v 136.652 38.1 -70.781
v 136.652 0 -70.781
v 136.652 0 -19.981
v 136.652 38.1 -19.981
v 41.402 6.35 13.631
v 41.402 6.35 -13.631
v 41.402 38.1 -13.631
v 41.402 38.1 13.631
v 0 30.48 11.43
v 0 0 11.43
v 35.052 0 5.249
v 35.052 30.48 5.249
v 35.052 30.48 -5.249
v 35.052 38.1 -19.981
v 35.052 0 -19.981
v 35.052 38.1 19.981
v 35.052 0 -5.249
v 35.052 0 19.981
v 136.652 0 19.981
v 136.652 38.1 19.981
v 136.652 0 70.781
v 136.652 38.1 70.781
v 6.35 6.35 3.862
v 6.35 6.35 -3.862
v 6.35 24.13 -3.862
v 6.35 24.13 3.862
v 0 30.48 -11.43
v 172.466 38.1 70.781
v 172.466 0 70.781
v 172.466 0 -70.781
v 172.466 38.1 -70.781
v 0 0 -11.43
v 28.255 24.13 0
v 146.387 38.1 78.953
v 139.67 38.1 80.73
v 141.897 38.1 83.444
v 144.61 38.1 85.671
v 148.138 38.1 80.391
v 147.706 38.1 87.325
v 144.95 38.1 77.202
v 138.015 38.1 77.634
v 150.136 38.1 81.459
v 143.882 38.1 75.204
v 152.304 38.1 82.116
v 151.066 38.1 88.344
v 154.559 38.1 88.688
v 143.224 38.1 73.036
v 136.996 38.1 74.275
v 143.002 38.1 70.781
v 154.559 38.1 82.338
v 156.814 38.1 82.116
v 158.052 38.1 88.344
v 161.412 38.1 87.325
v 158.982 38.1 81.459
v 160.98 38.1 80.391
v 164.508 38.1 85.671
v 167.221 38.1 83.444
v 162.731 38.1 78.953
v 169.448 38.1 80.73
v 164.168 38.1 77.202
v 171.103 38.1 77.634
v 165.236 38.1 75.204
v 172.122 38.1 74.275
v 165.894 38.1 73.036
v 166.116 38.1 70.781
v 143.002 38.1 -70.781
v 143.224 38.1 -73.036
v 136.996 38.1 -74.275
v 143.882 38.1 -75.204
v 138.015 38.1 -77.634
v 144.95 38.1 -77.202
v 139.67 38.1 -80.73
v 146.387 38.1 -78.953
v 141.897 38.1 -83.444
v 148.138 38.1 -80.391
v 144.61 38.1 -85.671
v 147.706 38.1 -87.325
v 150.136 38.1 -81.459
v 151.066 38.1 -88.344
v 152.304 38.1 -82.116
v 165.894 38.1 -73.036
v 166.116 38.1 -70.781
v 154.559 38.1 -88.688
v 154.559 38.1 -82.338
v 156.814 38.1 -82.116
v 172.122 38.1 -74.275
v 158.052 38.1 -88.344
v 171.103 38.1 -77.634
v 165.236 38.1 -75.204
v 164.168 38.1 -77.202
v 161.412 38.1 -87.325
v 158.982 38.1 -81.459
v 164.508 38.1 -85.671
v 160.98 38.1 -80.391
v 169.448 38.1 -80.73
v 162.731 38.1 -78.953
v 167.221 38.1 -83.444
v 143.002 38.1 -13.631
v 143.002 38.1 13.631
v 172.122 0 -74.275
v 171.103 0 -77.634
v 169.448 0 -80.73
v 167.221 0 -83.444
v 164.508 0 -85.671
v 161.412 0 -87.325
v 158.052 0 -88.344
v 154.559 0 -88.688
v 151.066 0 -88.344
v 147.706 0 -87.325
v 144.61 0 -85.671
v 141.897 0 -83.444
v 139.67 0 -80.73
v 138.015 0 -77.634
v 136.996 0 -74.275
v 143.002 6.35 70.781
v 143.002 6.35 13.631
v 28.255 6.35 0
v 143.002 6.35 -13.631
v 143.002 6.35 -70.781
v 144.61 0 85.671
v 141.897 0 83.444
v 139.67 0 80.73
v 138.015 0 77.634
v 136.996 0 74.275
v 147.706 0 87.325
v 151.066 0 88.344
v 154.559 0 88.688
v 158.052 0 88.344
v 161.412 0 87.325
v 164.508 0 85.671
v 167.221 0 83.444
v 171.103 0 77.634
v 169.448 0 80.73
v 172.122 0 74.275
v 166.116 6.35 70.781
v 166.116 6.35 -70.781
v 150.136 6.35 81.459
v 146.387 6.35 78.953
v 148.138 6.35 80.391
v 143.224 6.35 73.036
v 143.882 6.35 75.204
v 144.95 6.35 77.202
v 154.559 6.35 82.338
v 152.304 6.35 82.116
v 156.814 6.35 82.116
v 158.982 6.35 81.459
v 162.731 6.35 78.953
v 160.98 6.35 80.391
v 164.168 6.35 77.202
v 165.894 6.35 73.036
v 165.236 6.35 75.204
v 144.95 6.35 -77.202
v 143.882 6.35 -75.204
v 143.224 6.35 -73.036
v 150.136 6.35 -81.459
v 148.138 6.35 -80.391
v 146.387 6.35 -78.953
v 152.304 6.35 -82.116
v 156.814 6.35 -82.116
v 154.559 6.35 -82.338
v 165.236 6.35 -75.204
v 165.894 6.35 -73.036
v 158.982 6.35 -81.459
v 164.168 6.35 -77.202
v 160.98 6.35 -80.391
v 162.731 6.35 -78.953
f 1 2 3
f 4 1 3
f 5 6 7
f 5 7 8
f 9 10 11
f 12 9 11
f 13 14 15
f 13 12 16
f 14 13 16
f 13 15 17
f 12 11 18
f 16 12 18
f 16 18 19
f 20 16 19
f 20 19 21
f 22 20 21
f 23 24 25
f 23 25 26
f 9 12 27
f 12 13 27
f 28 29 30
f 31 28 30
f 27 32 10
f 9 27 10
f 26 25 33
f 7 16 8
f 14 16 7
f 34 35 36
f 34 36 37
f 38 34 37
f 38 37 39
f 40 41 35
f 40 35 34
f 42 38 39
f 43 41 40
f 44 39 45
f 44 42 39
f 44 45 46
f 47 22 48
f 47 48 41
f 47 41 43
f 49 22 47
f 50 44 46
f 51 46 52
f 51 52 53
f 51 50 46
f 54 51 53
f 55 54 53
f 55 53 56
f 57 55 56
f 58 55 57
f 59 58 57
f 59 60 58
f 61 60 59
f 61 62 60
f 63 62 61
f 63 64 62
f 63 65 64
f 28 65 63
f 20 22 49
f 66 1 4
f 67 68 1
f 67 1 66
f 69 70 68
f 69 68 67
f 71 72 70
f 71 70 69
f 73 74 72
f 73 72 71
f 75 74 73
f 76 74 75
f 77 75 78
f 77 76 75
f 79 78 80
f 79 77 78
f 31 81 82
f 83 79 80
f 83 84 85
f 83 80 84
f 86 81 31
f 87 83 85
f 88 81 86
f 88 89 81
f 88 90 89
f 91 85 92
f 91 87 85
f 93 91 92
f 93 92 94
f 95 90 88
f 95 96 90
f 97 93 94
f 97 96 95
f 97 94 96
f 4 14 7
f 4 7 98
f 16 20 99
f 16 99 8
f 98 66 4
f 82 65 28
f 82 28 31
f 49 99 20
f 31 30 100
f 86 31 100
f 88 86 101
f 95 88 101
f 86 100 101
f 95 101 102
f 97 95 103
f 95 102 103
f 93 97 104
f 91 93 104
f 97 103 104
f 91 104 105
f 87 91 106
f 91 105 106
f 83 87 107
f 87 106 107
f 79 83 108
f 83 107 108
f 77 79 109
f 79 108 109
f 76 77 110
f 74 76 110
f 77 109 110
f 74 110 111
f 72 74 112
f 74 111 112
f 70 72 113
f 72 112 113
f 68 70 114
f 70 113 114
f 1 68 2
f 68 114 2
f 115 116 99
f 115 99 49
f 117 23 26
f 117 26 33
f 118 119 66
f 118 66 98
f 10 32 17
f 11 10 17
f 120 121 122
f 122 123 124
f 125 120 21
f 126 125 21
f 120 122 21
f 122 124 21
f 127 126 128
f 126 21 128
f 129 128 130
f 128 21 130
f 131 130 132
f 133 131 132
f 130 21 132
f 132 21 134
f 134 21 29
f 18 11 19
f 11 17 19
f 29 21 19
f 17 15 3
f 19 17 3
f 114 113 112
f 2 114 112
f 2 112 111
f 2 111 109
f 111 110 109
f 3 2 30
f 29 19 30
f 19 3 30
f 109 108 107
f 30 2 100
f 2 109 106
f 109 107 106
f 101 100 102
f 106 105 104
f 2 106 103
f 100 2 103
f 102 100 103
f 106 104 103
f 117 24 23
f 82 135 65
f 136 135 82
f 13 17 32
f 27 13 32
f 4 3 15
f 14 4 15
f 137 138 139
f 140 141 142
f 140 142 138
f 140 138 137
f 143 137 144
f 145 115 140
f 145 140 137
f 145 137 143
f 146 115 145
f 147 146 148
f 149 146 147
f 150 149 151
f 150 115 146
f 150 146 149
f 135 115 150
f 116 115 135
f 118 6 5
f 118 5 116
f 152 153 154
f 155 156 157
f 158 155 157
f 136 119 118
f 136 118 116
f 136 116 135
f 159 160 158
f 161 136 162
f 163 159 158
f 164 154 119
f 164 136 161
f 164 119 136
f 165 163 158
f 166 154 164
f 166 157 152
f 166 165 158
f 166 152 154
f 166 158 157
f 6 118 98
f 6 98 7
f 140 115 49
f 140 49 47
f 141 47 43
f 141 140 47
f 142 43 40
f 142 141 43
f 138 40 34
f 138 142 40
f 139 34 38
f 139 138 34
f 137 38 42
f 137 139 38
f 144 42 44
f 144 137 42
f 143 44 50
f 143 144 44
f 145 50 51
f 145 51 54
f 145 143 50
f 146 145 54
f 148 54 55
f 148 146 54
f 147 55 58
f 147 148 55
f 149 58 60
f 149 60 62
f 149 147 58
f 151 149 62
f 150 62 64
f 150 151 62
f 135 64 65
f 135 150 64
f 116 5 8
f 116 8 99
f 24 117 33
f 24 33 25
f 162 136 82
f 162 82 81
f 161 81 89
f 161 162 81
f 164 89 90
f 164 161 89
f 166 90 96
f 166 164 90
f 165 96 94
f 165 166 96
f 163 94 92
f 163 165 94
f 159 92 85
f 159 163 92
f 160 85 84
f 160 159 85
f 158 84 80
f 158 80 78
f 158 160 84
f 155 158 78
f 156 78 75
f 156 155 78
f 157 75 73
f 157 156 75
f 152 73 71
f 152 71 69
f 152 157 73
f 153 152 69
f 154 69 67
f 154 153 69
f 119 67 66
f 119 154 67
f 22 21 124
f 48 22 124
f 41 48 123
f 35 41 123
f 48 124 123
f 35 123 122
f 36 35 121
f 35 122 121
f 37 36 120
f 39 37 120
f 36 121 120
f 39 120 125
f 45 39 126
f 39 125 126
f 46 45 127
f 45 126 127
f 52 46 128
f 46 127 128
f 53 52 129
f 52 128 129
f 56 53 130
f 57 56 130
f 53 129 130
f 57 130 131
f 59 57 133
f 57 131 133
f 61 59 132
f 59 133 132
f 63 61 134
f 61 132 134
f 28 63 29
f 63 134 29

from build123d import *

# Parameters (mm, degrees)
BOSS_EXTRUDE1_DEPTH = 38.1
CUT_EXTRUDE10_DEPTH = 7.62
SHELL2_START        = 6.35
SHELL2_DEPTH        = 31.75
SHELL2_2_DEPTH      = 17.78


# Read off the part's stored shape, not the designer's step: Shell2
with BuildPart() as part:
    # Sketch1 → Boss-Extrude1 (new body)
    with BuildSketch(Plane(origin=(0, 0, 0), x_dir=(1, 0, 0), z_dir=(0, 1, 0))):
        with BuildLine():
            Line((0, 11.43), (0, -11.43))
            Line((0, -11.43), (35.052, -5.249386672))
            Line((35.052, -5.249386672), (35.052, -19.981386672))
            Line((35.052, -19.981386672), (136.652, -19.981386672))
            Line((136.652, -19.981386672), (136.652, -70.781386672))
            ThreePointArc((136.652, -70.781386672), (154.559, -88.688386672), (172.466, -70.781386672))
            Line((172.466, -70.781386672), (172.466, 70.781386672))
            ThreePointArc((172.466, 70.781386672), (154.559, 88.688386672), (136.652, 70.781386672))
            Line((136.652, 70.781386672), (136.652, 19.981386672))
            Line((136.652, 19.981386672), (35.052, 19.981386672))
            Line((35.052, 19.981386672), (35.052, 5.249386672))
            Line((35.052, 5.249386672), (0, 11.43))
        make_face()
    extrude(amount=BOSS_EXTRUDE1_DEPTH)

    # Sketch5 → Cut-Extrude10 (cut)
    with BuildSketch(Plane(origin=(0, 38.1, 0), x_dir=(1, 0, 0), z_dir=(0, 1, 0))):
        Polygon((0, -11.43), (0, 11.43), (0.210478784, 11.603037745), (35.052, 5.249386672), (35.052, -5.249386672), align=None)
    extrude(amount=-CUT_EXTRUDE10_DEPTH, mode=Mode.SUBTRACT)

    # Shell2 outline → Shell2 (cut)
    with BuildSketch(Plane(origin=(0, 0, 0), x_dir=(1, 0, 0), z_dir=(0, 1, 0)).offset(SHELL2_START)):
        with BuildLine():
            Line((41.402, 13.631386672), (41.402, -13.631386672))
            Line((41.402, -13.631386672), (143.002, -13.631386672))
            Line((143.002, -13.631386672), (143.002, -70.781386672))
            ThreePointArc((143.002, -70.781386672), (154.559, -82.338386672), (166.116, -70.781386672))
            Line((166.116, -70.781386672), (166.116, 70.781386672))
            ThreePointArc((166.116, 70.781386672), (154.559, 82.338386672), (143.002, 70.781386672))
            Line((143.002, 70.781386672), (143.002, 13.631386672))
            Line((143.002, 13.631386672), (41.402, 13.631386672))
        make_face()
    extrude(amount=SHELL2_DEPTH, mode=Mode.SUBTRACT)

    # Shell2 2 outline → Shell2 2 (cut)
    with BuildSketch(Plane(origin=(0, 0, 0), x_dir=(1, 0, 0), z_dir=(0, 1, 0)).offset(SHELL2_START)):
        Polygon((28.25455863, 0), (6.35, 3.862364687), (6.35, -3.862364687), align=None)
    extrude(amount=SHELL2_2_DEPTH, mode=Mode.SUBTRACT)


solid = part.part
